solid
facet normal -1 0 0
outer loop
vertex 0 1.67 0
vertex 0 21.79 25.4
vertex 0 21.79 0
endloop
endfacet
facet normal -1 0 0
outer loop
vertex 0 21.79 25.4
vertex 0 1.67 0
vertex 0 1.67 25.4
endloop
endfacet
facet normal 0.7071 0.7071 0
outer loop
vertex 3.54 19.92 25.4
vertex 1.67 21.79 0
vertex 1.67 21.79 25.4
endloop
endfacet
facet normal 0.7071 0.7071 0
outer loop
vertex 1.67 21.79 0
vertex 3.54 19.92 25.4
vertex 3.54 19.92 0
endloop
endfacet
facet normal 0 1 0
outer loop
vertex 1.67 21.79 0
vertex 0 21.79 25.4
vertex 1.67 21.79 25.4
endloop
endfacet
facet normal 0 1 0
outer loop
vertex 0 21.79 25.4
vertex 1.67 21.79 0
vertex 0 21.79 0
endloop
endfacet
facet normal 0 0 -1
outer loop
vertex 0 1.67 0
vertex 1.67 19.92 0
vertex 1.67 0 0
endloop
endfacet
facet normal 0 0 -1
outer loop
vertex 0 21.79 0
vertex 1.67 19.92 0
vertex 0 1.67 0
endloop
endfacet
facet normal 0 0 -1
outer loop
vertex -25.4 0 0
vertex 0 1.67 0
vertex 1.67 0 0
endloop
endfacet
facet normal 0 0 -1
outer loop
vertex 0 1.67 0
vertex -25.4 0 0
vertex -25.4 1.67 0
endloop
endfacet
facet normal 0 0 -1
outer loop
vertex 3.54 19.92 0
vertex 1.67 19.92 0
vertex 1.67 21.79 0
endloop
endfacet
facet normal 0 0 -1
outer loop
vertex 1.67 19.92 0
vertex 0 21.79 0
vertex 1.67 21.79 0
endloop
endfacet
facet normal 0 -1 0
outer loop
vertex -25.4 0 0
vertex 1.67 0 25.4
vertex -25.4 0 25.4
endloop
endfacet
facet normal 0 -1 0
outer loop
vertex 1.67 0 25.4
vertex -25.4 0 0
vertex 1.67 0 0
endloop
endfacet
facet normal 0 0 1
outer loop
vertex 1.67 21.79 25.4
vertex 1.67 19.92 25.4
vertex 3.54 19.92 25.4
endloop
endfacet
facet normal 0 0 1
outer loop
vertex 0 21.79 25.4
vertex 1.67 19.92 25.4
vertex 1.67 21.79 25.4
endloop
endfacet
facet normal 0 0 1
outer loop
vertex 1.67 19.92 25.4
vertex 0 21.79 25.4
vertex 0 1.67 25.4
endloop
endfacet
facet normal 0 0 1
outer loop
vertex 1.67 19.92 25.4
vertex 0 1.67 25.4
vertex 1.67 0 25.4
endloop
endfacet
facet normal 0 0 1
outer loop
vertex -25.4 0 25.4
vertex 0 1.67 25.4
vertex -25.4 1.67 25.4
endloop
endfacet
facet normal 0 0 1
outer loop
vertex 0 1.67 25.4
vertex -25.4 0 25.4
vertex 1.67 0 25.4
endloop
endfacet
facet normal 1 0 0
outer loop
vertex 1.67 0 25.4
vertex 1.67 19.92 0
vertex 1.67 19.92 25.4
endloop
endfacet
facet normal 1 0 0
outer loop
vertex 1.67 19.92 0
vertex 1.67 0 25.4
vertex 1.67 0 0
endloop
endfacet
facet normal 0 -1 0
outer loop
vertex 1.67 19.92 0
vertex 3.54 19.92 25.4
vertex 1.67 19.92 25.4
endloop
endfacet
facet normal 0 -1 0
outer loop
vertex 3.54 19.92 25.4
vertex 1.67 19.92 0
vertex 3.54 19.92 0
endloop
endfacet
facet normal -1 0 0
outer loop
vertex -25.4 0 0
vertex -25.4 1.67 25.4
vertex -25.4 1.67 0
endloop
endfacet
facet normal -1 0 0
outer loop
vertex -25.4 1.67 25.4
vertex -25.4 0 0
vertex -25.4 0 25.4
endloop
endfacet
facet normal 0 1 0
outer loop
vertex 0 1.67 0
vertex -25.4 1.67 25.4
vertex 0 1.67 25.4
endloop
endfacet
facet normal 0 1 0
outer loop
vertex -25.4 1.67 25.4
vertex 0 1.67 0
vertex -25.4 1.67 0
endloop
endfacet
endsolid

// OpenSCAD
t_wood = 20.12;
width = 25.4;

thickness = 1.67;


translate([-width, 0, 0]) cube([width, thickness, width]);
difference(){
	hull(){
		translate([0, t_wood, 0]) cube([thickness, thickness, width]);
		cube([t_wood+thickness, thickness, width]);
	}
	translate([thickness,-.1,-.1]){
		cube([999,t_wood-.1,width+.2]);
	}
}
